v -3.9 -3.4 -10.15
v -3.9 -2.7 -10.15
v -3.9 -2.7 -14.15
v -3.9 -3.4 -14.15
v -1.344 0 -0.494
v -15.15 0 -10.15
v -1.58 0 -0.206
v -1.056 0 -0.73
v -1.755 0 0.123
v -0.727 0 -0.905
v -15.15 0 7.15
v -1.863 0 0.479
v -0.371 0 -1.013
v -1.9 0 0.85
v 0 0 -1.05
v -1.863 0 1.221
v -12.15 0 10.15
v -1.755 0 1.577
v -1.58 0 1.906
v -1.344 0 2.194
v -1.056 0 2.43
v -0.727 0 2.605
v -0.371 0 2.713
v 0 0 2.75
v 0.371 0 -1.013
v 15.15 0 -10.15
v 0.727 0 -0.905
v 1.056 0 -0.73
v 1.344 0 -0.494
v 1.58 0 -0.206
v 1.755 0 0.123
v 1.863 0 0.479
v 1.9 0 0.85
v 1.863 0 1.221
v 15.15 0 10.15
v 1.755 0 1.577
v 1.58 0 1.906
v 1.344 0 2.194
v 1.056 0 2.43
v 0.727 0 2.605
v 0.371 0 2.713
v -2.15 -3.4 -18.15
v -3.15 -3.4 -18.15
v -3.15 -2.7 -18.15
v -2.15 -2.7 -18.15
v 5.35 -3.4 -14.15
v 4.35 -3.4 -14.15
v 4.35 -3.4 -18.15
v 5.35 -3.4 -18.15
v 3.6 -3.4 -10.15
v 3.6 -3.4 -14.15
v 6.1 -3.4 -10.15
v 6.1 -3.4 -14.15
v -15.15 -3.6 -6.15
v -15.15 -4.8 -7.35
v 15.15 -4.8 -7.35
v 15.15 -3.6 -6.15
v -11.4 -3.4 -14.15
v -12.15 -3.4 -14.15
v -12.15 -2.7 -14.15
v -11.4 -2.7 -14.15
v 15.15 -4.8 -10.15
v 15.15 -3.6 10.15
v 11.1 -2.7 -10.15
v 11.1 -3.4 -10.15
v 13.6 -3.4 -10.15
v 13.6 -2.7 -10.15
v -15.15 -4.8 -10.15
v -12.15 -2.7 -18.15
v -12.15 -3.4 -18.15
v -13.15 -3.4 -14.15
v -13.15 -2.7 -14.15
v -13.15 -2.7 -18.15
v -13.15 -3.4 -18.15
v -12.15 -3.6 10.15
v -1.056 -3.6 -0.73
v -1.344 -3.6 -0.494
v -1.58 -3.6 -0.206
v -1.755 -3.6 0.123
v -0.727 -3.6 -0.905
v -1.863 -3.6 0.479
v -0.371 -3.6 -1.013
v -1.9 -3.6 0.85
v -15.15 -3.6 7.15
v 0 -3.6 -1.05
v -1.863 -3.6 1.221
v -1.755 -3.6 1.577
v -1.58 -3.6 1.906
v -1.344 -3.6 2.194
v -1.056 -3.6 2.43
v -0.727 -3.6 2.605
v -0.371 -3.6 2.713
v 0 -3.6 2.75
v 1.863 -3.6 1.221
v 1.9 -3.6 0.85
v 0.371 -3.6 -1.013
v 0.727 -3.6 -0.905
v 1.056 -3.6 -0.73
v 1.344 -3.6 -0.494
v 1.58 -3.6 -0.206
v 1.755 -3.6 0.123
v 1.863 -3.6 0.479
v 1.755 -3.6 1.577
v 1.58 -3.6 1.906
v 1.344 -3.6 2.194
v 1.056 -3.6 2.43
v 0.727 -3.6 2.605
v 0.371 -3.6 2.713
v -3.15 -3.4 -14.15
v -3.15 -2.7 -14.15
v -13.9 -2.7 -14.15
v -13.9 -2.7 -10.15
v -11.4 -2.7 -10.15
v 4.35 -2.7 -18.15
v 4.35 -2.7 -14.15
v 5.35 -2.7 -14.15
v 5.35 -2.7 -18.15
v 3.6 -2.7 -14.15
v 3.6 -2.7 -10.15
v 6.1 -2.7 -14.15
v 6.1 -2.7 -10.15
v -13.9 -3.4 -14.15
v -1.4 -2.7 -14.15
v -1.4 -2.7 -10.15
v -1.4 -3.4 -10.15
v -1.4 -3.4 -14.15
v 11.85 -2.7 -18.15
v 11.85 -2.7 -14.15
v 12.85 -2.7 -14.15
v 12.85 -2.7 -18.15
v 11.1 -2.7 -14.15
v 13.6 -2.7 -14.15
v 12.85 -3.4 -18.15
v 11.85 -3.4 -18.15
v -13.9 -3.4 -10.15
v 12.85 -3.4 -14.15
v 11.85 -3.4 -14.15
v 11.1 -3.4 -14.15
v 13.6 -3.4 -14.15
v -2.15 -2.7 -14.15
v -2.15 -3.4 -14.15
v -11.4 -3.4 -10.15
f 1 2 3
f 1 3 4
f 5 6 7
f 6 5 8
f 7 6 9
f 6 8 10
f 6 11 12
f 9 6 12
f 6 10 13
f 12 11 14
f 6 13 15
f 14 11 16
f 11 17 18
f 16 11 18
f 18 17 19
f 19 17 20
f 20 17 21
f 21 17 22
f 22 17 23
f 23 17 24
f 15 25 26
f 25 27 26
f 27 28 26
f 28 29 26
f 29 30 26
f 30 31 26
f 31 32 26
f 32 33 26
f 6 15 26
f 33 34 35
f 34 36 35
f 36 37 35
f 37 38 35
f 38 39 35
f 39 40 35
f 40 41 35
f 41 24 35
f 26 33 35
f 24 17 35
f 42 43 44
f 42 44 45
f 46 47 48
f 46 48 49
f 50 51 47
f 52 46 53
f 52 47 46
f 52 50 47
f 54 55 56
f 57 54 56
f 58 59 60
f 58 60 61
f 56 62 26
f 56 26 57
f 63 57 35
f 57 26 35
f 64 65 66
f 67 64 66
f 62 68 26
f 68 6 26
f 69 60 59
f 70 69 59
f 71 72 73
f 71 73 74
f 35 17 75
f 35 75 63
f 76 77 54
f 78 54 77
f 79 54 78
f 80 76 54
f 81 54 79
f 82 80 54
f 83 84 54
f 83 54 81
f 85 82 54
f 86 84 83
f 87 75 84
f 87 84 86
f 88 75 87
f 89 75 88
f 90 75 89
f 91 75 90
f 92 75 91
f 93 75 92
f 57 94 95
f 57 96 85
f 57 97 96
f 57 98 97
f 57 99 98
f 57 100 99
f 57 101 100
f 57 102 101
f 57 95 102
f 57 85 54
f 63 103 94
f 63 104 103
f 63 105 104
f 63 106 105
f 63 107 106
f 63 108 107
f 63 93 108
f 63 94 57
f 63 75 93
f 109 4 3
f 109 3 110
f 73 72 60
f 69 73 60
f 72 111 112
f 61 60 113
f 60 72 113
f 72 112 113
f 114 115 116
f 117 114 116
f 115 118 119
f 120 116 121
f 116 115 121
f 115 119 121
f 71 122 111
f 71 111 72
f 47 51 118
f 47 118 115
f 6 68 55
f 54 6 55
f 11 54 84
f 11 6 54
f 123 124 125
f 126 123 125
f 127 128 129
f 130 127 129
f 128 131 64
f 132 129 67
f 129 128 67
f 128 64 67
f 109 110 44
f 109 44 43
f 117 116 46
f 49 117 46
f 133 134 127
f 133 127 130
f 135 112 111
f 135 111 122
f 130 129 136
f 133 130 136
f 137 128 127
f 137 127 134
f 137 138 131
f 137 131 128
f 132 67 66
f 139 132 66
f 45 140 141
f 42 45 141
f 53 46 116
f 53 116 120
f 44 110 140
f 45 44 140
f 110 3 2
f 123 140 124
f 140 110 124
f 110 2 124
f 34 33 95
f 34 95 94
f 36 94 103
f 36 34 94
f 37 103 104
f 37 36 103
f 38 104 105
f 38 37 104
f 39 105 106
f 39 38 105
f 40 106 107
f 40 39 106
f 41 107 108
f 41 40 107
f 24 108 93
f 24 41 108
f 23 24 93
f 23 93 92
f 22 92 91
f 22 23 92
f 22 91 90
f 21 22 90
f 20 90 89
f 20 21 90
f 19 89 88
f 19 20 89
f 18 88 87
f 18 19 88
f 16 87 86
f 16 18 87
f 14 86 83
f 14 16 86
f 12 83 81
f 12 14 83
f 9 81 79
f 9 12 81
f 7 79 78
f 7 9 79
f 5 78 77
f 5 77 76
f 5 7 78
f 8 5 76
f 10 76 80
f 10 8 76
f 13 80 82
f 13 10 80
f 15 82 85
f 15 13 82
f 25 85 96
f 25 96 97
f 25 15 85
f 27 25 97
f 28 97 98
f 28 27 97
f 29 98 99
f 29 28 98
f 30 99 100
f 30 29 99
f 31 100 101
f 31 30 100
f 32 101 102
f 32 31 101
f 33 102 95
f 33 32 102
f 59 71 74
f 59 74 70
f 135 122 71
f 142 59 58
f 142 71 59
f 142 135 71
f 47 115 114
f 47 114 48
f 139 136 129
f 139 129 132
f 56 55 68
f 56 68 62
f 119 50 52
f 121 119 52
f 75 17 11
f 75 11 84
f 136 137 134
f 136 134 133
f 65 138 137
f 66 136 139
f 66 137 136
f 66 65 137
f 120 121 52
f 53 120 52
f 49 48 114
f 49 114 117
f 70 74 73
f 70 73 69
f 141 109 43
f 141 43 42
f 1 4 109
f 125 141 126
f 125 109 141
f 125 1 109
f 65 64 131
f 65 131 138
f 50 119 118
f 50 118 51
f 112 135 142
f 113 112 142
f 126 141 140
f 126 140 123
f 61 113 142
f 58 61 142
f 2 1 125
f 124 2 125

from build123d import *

# Parameters (mm, degrees)
F0_W     = 30.3
F0_H     = 20.3
F0_R     = 1.9
F1_DEPTH = 3.6
F2_W     = 30.3
F2_H     = 4
F3_DEPTH = 1.2
F4_SIZE  = 1.19999
F5_SIZE  = 3
F6_W     = 2.5
F6_H     = 0.7
F7_DEPTH = 4
F8_W     = 1
F8_H     = 0.7
F9_DEPTH = 4


# Not quite as in the source:
# - a fillet or chamfer is up to 0.001 mm smaller than in the source, because OpenCascade refuses the exact size


with BuildPart() as f1:
    # F0 (on Front) → F1 (new body)
    with BuildSketch(Plane.XZ):
        Rectangle(F0_W, F0_H)
        with Locations((0, 0.85)):
            Circle(F0_R, mode=Mode.SUBTRACT)
    extrude(amount=F1_DEPTH)

    # F2 (on face) → F3 (join)
    with BuildSketch(Plane.XZ.offset(3.6)):
        with Locations((0, -8.15)):
            Rectangle(F2_W, F2_H)
    extrude(amount=F3_DEPTH)

    # F4 (size 1.2 in the source; OpenCascade refuses exactly that, so slightly less here)
    f4_edges = [f1.edges().sort_by_distance(p)[0] for p in [
        (0, -4.8, -6.15),
    ]]
    chamfer(f4_edges, length=F4_SIZE)

    # F5
    f5_edges = [f1.edges().sort_by_distance(p)[0] for p in [
        (-15.15, -1.8, 10.15),
    ]]
    chamfer(f5_edges, length=F5_SIZE)


with BuildPart() as f7:
    # F6 (on face) → F7 (new body)
    with BuildSketch(Plane(origin=(0, 0, -10.15), x_dir=(1, 0, 0), z_dir=(0, 0, -1))):
        with Locations((-12.65, 3.05)):
            Rectangle(F6_W, F6_H)
    extrude(amount=F7_DEPTH)

    # F8 (on face) → F9 (join)
    with BuildSketch(Plane(origin=(0, 0, -14.15), x_dir=(1, 0, 0), z_dir=(0, 0, -1))):
        with Locations((-12.65, 3.05)):
            Rectangle(F8_W, F8_H)
    extrude(amount=F9_DEPTH)


with BuildPart() as f7b:
    # F6 (on face) → F7, piece 2 (new body)
    with BuildSketch(Plane(origin=(0, 0, -10.15), x_dir=(1, 0, 0), z_dir=(0, 0, -1))):
        with Locations((4.85, 3.05)):
            Rectangle(F6_W, F6_H)
    extrude(amount=F7_DEPTH)

    # F8 (on face) → F9, piece 3 (join)
    with BuildSketch(Plane(origin=(0, 0, -14.15), x_dir=(1, 0, 0), z_dir=(0, 0, -1))):
        with Locations((4.85, 3.05)):
            Rectangle(F8_W, F8_H)
    extrude(amount=F9_DEPTH)


with BuildPart() as f7c:
    # F6 (on face) → F7, piece 3 (new body)
    with BuildSketch(Plane(origin=(0, 0, -10.15), x_dir=(1, 0, 0), z_dir=(0, 0, -1))):
        with Locations((12.35, 3.05)):
            Rectangle(F6_W, F6_H)
    extrude(amount=F7_DEPTH)

    # F8 (on face) → F9, piece 4 (join)
    with BuildSketch(Plane(origin=(0, 0, -14.15), x_dir=(1, 0, 0), z_dir=(0, 0, -1))):
        with Locations((12.35, 3.05)):
            Rectangle(F8_W, F8_H)
    extrude(amount=F9_DEPTH)


with BuildPart() as f7d:
    # F6 (on face) → F7, piece 4 (new body)
    with BuildSketch(Plane(origin=(0, 0, -10.15), x_dir=(1, 0, 0), z_dir=(0, 0, -1))):
        with Locations((-2.65, 3.05)):
            Rectangle(F6_W, F6_H)
    extrude(amount=F7_DEPTH)

    # F8 (on face) → F9, piece 2 (join)
    with BuildSketch(Plane(origin=(0, 0, -14.15), x_dir=(1, 0, 0), z_dir=(0, 0, -1))):
        with Locations((-2.65, 3.05)):
            Rectangle(F8_W, F8_H)
    extrude(amount=F9_DEPTH)


solid = Compound([f1.part, f7.part, f7b.part, f7c.part, f7d.part])
